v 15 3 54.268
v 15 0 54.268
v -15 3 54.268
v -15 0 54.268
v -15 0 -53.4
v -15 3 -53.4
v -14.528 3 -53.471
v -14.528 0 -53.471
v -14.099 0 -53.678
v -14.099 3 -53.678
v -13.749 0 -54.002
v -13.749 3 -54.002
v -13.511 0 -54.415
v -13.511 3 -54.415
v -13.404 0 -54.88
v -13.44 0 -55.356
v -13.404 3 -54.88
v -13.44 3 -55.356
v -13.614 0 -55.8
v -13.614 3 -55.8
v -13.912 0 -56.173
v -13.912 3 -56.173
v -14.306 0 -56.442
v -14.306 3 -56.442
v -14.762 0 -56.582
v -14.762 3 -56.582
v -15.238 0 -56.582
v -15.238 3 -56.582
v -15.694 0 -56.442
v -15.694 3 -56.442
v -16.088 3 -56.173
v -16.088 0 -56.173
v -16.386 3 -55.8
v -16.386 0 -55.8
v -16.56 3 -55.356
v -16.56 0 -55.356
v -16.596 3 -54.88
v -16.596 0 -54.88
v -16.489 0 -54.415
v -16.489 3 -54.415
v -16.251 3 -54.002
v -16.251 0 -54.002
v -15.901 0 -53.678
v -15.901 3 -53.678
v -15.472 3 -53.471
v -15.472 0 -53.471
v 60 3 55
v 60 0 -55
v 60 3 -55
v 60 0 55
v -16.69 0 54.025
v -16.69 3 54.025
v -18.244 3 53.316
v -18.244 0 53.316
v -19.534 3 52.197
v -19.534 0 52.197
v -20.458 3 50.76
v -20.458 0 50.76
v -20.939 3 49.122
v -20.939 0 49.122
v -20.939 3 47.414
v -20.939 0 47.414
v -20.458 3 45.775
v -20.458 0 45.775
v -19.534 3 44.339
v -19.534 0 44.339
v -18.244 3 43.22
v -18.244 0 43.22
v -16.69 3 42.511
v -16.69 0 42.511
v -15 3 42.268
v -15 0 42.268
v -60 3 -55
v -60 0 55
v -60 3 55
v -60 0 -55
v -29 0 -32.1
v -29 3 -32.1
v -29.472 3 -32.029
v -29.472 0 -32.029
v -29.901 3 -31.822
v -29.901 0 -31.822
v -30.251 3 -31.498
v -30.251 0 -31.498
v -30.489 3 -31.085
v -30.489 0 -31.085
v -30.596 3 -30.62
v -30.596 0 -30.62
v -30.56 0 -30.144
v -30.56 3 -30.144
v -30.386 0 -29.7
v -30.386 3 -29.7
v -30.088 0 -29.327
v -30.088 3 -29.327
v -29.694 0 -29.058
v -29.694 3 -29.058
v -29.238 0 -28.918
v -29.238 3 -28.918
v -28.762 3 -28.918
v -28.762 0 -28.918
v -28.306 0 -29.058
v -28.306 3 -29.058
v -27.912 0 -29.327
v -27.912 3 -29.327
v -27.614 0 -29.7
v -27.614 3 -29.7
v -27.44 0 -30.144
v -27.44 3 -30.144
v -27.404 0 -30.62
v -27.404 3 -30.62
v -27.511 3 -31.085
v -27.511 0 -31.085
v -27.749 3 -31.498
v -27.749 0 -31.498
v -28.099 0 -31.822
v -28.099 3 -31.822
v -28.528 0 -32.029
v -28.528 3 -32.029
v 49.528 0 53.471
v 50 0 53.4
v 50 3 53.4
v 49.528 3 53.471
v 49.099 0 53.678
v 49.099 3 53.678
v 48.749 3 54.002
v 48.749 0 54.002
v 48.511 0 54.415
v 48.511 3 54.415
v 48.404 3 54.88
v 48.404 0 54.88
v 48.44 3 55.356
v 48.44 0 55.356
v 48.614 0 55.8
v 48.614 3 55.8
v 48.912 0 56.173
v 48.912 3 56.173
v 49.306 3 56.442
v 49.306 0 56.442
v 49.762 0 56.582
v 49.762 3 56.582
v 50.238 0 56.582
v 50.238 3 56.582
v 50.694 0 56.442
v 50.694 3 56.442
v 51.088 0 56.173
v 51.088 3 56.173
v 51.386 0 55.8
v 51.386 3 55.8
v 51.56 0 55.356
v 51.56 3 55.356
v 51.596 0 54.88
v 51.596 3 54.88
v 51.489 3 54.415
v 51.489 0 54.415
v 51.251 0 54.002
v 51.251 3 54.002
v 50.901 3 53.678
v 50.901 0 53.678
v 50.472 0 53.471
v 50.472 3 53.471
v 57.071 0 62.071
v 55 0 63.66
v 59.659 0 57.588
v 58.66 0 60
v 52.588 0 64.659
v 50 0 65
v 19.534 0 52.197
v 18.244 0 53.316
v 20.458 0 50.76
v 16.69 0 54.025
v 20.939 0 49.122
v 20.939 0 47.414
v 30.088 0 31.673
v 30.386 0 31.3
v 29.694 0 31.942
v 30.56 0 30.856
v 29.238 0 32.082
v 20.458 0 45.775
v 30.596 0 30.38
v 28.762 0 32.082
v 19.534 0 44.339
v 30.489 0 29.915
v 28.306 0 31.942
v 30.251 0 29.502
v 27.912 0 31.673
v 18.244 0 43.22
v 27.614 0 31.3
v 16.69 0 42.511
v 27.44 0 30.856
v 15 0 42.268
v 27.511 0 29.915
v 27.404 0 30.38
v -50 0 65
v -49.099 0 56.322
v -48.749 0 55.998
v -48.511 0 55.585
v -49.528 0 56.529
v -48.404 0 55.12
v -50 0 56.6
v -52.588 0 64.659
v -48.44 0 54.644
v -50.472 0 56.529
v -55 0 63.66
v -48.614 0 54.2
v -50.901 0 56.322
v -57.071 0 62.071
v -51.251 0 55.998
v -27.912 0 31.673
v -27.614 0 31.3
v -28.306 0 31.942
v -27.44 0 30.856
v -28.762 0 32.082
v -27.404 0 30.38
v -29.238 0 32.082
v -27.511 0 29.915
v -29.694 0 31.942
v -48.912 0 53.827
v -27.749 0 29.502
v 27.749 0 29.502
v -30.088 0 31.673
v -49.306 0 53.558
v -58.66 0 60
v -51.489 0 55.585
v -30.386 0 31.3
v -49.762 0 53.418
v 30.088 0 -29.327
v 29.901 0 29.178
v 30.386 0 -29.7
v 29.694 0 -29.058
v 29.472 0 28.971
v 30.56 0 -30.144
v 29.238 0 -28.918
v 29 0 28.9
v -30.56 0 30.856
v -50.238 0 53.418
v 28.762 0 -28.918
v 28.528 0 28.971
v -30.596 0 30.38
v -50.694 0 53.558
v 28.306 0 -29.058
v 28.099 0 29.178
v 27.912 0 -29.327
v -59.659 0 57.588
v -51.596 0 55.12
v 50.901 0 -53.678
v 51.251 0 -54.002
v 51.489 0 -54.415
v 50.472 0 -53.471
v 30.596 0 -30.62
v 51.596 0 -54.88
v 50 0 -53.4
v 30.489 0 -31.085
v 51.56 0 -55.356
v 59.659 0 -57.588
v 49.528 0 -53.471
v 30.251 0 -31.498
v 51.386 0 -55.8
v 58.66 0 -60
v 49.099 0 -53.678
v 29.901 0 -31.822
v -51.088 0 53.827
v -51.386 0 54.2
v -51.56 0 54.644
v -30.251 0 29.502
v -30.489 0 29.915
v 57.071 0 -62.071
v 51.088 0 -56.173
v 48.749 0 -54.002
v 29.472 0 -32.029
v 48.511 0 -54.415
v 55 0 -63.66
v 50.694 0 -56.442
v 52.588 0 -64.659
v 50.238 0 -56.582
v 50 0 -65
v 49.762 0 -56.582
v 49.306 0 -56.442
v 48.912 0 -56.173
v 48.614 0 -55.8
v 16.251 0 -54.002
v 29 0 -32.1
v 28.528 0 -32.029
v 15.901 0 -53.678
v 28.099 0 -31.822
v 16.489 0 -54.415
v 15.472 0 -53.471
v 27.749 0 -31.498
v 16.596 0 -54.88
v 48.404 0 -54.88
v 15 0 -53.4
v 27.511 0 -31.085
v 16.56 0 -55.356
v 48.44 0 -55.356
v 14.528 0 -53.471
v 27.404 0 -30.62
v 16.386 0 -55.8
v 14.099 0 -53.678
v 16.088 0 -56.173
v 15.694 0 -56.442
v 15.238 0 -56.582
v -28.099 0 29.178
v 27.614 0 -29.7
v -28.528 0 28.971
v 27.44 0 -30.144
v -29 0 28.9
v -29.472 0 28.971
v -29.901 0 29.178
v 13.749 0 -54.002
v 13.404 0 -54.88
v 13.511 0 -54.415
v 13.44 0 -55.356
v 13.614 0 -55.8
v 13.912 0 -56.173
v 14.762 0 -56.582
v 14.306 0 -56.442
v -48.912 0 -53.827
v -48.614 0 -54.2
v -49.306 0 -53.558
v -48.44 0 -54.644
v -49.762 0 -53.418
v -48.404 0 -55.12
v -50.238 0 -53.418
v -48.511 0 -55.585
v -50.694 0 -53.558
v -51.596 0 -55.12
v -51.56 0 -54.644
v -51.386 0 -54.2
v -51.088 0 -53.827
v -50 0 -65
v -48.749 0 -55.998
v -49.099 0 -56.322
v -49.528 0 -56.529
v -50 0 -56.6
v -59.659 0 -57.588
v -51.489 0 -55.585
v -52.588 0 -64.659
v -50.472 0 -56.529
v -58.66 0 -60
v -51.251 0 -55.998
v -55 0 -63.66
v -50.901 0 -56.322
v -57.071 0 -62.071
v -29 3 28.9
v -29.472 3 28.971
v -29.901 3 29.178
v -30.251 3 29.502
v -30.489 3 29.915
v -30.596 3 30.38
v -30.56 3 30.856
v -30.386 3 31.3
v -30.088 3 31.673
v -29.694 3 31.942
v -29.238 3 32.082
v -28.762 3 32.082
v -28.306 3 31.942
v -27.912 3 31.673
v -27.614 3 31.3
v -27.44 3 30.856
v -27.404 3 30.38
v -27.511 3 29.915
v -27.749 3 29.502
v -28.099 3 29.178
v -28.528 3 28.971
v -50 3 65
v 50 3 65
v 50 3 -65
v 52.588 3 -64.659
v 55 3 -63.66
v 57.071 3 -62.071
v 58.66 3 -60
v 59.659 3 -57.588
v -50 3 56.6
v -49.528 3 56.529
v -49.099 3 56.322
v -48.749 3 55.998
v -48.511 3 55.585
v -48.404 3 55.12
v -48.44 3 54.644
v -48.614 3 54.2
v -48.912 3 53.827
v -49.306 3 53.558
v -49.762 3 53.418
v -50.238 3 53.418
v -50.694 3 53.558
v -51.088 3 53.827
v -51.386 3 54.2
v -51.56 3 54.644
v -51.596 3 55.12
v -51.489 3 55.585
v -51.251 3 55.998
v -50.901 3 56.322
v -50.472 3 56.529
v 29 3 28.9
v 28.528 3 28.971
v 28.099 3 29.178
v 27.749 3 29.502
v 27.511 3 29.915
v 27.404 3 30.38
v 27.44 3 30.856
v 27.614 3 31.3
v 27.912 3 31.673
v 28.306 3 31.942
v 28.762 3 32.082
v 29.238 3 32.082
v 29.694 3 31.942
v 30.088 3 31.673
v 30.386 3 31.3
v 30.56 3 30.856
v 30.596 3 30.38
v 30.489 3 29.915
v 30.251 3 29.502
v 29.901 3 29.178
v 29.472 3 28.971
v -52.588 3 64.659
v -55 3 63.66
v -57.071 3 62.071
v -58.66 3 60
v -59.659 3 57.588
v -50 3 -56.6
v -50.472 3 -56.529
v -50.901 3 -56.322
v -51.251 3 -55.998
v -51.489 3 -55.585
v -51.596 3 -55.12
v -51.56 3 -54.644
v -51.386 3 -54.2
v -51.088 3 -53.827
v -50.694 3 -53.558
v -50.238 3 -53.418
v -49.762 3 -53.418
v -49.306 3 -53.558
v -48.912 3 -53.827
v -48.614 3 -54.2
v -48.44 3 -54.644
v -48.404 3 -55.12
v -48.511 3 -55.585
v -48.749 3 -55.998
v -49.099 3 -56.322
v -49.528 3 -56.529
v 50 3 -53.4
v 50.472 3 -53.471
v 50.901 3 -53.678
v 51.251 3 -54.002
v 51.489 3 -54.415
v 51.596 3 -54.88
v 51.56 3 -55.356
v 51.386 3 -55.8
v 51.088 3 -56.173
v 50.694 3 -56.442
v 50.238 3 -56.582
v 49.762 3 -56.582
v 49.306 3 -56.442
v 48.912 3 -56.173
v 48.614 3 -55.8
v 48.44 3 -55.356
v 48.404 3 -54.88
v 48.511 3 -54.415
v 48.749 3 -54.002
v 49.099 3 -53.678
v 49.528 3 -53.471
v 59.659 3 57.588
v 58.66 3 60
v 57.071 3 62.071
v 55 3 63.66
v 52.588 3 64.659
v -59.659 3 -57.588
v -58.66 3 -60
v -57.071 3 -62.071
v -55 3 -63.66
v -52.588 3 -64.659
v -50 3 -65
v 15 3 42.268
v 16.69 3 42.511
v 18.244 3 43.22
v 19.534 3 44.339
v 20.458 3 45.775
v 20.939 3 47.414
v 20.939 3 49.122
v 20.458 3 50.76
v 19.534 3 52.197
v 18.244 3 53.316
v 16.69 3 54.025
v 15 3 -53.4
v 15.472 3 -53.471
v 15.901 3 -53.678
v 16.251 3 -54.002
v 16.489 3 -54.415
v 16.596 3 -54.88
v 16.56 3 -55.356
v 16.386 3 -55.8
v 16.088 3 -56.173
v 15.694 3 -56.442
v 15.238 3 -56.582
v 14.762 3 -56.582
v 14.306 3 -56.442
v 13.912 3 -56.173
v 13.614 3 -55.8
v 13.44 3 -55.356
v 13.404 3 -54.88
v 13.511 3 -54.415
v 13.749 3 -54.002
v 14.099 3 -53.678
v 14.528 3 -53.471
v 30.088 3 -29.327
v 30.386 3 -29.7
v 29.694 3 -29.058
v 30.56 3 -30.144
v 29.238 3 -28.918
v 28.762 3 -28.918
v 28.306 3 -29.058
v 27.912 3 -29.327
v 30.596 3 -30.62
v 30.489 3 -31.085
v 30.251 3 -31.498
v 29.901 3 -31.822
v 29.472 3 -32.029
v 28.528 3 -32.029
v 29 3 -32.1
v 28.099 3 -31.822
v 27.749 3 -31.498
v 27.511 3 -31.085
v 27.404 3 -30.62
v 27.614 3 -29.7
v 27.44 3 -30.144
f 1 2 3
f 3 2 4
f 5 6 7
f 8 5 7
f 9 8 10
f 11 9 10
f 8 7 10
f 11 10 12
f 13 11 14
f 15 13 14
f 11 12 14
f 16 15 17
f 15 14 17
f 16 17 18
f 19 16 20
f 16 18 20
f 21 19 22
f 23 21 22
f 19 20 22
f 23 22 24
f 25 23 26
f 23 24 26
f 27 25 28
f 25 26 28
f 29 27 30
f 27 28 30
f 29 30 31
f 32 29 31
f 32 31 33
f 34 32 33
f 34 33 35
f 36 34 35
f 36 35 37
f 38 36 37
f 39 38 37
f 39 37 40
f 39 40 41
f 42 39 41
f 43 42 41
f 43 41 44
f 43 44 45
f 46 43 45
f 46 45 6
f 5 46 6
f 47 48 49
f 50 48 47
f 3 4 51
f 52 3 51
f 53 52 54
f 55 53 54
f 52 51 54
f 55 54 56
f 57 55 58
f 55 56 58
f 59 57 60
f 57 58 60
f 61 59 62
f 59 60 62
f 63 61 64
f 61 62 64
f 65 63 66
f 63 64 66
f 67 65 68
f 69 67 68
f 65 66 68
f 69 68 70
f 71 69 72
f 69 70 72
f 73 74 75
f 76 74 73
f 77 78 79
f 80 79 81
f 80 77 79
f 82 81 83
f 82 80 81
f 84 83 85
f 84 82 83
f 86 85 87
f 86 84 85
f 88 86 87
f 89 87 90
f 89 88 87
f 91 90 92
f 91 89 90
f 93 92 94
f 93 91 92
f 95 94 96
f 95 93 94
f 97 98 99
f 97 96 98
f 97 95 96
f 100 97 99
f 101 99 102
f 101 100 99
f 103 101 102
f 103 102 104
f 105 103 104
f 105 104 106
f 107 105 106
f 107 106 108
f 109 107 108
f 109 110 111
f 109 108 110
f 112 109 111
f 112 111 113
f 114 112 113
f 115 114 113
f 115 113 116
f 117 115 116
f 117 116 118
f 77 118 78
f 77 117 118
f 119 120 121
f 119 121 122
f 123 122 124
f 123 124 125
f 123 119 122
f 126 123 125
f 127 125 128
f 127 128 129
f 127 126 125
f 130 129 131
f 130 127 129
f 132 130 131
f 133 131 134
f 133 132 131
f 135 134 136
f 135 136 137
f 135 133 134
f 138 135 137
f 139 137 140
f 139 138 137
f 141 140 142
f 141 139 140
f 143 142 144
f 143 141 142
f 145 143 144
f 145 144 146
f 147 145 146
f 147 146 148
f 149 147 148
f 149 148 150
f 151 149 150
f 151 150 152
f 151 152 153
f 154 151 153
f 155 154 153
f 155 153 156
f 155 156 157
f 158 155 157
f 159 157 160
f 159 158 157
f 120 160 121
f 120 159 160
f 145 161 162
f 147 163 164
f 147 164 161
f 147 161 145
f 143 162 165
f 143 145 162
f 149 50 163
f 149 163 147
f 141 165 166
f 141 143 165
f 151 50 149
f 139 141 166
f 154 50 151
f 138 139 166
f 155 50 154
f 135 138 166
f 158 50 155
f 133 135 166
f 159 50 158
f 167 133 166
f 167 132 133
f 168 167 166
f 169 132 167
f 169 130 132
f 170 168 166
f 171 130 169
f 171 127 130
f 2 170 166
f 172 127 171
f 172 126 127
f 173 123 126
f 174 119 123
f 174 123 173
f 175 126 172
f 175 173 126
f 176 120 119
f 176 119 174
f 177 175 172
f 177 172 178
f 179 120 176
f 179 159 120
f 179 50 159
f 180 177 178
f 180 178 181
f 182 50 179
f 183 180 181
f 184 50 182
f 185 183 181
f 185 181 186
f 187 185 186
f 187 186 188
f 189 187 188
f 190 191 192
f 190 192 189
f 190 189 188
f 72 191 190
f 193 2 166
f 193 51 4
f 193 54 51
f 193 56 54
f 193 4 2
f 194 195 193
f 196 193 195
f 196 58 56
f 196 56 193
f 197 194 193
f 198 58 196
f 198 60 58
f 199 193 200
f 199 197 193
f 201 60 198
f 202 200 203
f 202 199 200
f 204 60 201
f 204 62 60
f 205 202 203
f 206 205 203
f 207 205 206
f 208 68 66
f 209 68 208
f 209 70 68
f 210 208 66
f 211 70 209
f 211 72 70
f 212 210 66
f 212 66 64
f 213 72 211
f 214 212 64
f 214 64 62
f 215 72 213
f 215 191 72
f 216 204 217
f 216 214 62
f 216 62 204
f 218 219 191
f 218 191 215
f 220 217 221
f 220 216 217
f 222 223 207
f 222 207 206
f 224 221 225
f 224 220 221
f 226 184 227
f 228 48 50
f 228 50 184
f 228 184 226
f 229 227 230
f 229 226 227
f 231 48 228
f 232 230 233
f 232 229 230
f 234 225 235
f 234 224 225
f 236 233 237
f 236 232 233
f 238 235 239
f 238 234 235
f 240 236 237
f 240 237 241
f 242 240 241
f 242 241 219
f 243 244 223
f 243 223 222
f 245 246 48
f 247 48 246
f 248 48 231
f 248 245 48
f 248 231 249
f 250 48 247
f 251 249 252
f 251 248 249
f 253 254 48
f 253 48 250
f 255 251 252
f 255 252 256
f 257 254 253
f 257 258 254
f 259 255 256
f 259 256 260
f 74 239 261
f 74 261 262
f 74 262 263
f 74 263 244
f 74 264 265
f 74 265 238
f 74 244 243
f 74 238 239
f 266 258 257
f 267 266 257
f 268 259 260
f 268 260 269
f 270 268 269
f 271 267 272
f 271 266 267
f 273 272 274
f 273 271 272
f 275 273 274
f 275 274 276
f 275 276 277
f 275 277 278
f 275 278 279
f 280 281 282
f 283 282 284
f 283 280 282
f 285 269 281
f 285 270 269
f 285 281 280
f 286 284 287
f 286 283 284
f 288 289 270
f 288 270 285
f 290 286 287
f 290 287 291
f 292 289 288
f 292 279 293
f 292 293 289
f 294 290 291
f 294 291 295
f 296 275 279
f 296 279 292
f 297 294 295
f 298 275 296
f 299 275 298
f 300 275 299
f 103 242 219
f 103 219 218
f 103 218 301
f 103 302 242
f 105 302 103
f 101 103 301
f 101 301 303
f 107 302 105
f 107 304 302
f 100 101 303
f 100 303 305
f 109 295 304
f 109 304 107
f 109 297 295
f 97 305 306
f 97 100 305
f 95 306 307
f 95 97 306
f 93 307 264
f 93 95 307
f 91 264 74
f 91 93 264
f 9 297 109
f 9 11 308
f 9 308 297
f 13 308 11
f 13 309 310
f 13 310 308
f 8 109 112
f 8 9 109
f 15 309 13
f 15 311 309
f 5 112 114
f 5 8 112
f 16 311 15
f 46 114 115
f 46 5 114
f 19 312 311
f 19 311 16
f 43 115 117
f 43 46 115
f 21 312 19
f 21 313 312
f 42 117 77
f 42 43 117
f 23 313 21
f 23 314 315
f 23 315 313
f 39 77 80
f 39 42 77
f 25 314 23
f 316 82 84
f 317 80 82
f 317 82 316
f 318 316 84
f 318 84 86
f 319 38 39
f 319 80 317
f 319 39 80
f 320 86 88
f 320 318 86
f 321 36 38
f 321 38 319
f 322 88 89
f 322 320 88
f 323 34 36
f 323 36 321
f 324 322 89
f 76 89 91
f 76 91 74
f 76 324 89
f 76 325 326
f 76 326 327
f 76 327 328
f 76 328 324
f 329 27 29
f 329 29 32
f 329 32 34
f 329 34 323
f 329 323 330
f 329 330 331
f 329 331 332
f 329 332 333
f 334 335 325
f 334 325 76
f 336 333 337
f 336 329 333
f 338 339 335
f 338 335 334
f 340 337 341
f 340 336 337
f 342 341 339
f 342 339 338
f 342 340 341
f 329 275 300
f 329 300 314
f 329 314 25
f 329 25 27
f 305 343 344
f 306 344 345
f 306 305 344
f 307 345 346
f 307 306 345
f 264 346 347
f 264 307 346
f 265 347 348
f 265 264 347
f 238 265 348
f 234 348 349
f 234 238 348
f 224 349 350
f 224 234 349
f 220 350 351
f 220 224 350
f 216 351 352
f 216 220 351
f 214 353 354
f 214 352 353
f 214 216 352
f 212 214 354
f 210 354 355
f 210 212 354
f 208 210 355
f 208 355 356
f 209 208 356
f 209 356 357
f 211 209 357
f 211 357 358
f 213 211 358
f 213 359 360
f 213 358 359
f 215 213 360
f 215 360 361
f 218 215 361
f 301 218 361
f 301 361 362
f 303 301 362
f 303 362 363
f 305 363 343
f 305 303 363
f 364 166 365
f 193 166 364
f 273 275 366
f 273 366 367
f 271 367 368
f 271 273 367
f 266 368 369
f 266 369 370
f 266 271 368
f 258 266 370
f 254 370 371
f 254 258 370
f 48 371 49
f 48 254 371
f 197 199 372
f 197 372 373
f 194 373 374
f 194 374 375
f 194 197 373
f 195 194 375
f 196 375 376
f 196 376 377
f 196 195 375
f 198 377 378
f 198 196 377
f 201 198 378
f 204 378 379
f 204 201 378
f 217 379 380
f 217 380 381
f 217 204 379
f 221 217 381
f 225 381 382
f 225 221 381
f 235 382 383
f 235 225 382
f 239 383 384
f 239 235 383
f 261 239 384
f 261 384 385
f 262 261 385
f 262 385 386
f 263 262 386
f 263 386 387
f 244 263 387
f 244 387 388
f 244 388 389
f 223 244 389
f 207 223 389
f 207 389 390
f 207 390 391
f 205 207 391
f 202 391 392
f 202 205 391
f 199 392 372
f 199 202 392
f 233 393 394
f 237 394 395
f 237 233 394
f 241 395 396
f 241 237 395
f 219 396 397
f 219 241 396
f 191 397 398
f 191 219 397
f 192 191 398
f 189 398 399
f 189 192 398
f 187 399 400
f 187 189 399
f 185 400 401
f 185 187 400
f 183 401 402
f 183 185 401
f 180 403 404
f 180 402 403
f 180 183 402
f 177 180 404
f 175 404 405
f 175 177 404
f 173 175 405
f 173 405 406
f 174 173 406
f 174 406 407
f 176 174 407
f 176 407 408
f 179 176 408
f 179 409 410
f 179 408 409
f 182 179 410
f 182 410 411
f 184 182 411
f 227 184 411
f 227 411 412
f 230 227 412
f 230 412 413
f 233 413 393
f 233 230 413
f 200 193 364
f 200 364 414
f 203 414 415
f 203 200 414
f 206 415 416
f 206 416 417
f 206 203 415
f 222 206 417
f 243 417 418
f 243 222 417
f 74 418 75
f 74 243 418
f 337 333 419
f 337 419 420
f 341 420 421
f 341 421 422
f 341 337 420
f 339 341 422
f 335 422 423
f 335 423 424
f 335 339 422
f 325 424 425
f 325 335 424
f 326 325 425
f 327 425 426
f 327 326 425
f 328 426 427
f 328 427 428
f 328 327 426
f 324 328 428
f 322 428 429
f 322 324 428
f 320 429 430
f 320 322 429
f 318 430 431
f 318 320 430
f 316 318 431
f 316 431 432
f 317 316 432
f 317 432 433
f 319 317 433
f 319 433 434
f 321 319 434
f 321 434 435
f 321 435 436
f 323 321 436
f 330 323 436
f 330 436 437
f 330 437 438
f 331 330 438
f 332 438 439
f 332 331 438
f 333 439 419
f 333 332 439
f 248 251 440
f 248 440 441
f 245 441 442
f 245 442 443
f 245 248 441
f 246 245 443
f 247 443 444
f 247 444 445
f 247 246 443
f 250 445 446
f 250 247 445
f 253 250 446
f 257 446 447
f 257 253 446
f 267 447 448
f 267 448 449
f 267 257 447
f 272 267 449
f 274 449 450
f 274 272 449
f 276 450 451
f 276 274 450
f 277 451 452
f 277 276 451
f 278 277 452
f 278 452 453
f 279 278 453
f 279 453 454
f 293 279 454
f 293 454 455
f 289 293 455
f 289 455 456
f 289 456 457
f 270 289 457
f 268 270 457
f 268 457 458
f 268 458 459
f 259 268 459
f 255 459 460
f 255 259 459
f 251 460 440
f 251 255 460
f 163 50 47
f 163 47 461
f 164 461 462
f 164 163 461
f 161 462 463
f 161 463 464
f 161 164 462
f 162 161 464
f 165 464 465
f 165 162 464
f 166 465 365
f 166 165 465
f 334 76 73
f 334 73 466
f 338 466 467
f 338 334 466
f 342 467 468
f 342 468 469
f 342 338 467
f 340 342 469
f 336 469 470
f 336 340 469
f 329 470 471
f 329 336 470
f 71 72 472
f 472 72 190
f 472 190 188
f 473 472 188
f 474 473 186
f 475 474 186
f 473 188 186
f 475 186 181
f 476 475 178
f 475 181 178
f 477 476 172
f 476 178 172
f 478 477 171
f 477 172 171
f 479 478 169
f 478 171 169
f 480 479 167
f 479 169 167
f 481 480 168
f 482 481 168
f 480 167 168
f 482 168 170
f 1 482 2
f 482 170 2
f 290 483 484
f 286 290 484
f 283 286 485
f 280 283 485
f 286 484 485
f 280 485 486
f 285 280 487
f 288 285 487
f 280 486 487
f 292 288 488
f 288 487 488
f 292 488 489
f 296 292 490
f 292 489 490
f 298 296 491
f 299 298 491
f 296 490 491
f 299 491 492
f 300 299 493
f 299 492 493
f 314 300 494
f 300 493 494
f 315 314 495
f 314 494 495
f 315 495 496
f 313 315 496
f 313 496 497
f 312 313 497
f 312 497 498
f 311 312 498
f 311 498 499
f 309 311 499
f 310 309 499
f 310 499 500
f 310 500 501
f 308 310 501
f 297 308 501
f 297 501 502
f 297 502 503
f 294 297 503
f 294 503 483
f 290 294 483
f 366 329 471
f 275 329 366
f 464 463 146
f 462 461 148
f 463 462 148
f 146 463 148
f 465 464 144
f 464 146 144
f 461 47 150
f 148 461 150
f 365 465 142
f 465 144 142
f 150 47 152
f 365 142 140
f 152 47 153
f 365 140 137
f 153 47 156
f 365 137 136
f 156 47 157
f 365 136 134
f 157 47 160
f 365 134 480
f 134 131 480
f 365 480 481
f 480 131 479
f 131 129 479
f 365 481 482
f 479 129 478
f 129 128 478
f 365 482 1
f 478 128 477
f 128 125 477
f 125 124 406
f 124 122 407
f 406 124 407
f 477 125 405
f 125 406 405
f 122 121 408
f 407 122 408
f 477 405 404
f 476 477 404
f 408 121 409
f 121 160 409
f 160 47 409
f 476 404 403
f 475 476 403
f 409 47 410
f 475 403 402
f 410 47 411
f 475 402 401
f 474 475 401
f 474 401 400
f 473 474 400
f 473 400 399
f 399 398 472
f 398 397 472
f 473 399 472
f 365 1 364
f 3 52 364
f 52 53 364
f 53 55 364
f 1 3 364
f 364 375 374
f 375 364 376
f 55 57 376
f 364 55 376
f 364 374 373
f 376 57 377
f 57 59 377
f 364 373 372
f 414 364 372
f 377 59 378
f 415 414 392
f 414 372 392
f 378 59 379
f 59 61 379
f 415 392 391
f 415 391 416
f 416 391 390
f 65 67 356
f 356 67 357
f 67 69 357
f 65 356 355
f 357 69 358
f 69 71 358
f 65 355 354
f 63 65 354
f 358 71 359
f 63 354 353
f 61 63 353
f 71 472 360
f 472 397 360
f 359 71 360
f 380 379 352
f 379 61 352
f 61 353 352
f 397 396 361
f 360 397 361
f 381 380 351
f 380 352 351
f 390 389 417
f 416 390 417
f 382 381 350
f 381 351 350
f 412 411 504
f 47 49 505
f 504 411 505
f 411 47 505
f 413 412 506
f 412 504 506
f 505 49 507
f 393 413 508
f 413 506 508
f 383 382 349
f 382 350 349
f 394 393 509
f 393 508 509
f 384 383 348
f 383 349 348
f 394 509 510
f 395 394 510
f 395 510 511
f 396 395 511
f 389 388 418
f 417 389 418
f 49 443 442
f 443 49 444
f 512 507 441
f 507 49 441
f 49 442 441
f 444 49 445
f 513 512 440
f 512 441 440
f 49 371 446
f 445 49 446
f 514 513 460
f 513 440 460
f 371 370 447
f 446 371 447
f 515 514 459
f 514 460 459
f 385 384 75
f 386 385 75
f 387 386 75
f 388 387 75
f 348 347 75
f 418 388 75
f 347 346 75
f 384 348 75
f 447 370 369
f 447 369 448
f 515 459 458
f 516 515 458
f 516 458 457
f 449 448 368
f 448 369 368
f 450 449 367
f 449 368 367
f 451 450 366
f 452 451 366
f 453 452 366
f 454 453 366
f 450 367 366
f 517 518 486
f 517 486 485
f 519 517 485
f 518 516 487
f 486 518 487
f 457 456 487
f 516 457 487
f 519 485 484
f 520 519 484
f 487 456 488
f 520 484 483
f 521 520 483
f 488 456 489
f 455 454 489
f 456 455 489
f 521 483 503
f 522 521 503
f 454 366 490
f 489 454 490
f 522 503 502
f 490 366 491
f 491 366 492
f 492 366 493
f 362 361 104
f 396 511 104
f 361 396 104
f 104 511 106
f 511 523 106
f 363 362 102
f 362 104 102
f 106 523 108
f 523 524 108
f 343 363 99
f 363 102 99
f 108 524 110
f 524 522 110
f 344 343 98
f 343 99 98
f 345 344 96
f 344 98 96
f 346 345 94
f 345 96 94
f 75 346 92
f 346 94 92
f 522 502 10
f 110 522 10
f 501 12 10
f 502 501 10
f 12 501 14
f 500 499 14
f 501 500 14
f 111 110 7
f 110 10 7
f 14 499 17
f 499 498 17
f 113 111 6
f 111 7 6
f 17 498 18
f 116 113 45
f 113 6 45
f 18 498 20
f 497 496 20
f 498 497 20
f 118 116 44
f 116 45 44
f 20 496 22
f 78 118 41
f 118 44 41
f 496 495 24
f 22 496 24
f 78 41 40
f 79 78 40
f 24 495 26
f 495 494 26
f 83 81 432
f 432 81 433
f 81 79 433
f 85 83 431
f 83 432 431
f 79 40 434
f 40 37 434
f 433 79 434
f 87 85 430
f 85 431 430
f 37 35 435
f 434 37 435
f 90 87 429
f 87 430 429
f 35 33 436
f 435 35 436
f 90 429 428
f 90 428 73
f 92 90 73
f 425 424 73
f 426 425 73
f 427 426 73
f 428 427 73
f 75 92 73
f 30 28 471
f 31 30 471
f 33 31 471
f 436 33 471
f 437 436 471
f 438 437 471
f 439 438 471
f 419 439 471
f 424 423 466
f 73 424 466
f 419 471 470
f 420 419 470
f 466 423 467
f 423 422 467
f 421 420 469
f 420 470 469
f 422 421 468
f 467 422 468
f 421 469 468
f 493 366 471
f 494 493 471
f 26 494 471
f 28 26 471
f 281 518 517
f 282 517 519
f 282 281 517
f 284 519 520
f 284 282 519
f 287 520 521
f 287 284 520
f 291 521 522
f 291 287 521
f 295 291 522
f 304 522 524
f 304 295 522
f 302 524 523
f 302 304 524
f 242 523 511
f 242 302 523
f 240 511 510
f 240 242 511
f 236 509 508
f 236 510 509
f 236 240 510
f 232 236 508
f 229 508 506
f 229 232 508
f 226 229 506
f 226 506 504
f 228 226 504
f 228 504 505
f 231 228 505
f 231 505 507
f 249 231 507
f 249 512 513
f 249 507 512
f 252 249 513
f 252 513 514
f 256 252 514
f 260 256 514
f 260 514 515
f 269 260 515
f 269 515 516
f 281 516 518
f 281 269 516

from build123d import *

# Parameters (mm, degrees)
SKETCH1_R           = 1.6
BOSS_EXTRUDE1_DEPTH = 3
SKETCH2_R           = 1.6
CUT_EXTRUDE1_DEPTH  = 45
SKETCH3_R           = 1.6
CUT_EXTRUDE2_DEPTH  = 89.509886453


with BuildPart() as part:
    # Sketch1 → Boss-Extrude1 (new body)
    with BuildSketch(Plane(origin=(0, 0, 0), x_dir=(1, 0, 0), z_dir=(0, 1, 0))):
        with BuildLine():
            Line((-50, 65), (50, 65))
            ThreePointArc((50, 65), (57.071067812, 62.071067812), (60, 55))
            Line((60, 55), (60, -55))
            ThreePointArc((60, -55), (57.071067812, -62.071067812), (50, -65))
            Line((50, -65), (-50, -65))
            ThreePointArc((-50, -65), (-57.071067812, -62.071067812), (-60, -55))
            Line((-60, -55), (-60, 55))
            ThreePointArc((-60, 55), (-57.071067812, 62.071067812), (-50, 65))
        make_face()
        with Locations(Location((50, -55, 0), (0, 0, 90))):
            Circle(SKETCH1_R, mode=Mode.SUBTRACT)
        with Locations(Location((50, 55, 0), (0, 0, 270))):
            Circle(SKETCH1_R, mode=Mode.SUBTRACT)
        with Locations(Location((-50, -55, 0), (0, 0, 270))):
            Circle(SKETCH1_R, mode=Mode.SUBTRACT)
        with Locations(Location((-50, 55, 0), (0, 0, 90))):
            Circle(SKETCH1_R, mode=Mode.SUBTRACT)
        with BuildLine():
            Line((-15, -42.267985155), (15, -42.267985155))
            ThreePointArc((15, -42.267985155), (21, -48.267985155), (15, -54.267985155))
            Line((15, -54.267985155), (-15, -54.267985155))
            ThreePointArc((-15, -54.267985155), (-21, -48.267985155), (-15, -42.267985155))
        make_face(mode=Mode.SUBTRACT)
    extrude(amount=BOSS_EXTRUDE1_DEPTH)

    # Sketch2 → Cut-Extrude1 (cut)
    with BuildSketch(Plane(origin=(0, 0, 0), x_dir=(1, 0, 0), z_dir=(0, 1, 0))):
        with Locations(Location((29, 30.5, 0), (0, 0, 90))):
            Circle(SKETCH2_R)
        with Locations(Location((-29, 30.5, 0), (0, 0, 90))):
            Circle(SKETCH2_R)
        with Locations(Location((29, -30.5, 0), (0, 0, 90))):
            Circle(SKETCH2_R)
        with Locations(Location((-29, -30.5, 0), (0, 0, 90))):
            Circle(SKETCH2_R)
    extrude(amount=CUT_EXTRUDE1_DEPTH, mode=Mode.SUBTRACT)

    # Sketch3 → Cut-Extrude2 (cut, through all)
    with BuildSketch(Plane(origin=(0, 3, 0), x_dir=(1, 0, 0), z_dir=(0, 1, 0))):
        with Locations(Location((-15, 55, 0), (0, 0, 270))):
            Circle(SKETCH3_R)
        with Locations(Location((15, 55, 0), (0, 0, 270))):
            Circle(SKETCH3_R)
    extrude(amount=-CUT_EXTRUDE2_DEPTH, mode=Mode.SUBTRACT)


solid = part.part
